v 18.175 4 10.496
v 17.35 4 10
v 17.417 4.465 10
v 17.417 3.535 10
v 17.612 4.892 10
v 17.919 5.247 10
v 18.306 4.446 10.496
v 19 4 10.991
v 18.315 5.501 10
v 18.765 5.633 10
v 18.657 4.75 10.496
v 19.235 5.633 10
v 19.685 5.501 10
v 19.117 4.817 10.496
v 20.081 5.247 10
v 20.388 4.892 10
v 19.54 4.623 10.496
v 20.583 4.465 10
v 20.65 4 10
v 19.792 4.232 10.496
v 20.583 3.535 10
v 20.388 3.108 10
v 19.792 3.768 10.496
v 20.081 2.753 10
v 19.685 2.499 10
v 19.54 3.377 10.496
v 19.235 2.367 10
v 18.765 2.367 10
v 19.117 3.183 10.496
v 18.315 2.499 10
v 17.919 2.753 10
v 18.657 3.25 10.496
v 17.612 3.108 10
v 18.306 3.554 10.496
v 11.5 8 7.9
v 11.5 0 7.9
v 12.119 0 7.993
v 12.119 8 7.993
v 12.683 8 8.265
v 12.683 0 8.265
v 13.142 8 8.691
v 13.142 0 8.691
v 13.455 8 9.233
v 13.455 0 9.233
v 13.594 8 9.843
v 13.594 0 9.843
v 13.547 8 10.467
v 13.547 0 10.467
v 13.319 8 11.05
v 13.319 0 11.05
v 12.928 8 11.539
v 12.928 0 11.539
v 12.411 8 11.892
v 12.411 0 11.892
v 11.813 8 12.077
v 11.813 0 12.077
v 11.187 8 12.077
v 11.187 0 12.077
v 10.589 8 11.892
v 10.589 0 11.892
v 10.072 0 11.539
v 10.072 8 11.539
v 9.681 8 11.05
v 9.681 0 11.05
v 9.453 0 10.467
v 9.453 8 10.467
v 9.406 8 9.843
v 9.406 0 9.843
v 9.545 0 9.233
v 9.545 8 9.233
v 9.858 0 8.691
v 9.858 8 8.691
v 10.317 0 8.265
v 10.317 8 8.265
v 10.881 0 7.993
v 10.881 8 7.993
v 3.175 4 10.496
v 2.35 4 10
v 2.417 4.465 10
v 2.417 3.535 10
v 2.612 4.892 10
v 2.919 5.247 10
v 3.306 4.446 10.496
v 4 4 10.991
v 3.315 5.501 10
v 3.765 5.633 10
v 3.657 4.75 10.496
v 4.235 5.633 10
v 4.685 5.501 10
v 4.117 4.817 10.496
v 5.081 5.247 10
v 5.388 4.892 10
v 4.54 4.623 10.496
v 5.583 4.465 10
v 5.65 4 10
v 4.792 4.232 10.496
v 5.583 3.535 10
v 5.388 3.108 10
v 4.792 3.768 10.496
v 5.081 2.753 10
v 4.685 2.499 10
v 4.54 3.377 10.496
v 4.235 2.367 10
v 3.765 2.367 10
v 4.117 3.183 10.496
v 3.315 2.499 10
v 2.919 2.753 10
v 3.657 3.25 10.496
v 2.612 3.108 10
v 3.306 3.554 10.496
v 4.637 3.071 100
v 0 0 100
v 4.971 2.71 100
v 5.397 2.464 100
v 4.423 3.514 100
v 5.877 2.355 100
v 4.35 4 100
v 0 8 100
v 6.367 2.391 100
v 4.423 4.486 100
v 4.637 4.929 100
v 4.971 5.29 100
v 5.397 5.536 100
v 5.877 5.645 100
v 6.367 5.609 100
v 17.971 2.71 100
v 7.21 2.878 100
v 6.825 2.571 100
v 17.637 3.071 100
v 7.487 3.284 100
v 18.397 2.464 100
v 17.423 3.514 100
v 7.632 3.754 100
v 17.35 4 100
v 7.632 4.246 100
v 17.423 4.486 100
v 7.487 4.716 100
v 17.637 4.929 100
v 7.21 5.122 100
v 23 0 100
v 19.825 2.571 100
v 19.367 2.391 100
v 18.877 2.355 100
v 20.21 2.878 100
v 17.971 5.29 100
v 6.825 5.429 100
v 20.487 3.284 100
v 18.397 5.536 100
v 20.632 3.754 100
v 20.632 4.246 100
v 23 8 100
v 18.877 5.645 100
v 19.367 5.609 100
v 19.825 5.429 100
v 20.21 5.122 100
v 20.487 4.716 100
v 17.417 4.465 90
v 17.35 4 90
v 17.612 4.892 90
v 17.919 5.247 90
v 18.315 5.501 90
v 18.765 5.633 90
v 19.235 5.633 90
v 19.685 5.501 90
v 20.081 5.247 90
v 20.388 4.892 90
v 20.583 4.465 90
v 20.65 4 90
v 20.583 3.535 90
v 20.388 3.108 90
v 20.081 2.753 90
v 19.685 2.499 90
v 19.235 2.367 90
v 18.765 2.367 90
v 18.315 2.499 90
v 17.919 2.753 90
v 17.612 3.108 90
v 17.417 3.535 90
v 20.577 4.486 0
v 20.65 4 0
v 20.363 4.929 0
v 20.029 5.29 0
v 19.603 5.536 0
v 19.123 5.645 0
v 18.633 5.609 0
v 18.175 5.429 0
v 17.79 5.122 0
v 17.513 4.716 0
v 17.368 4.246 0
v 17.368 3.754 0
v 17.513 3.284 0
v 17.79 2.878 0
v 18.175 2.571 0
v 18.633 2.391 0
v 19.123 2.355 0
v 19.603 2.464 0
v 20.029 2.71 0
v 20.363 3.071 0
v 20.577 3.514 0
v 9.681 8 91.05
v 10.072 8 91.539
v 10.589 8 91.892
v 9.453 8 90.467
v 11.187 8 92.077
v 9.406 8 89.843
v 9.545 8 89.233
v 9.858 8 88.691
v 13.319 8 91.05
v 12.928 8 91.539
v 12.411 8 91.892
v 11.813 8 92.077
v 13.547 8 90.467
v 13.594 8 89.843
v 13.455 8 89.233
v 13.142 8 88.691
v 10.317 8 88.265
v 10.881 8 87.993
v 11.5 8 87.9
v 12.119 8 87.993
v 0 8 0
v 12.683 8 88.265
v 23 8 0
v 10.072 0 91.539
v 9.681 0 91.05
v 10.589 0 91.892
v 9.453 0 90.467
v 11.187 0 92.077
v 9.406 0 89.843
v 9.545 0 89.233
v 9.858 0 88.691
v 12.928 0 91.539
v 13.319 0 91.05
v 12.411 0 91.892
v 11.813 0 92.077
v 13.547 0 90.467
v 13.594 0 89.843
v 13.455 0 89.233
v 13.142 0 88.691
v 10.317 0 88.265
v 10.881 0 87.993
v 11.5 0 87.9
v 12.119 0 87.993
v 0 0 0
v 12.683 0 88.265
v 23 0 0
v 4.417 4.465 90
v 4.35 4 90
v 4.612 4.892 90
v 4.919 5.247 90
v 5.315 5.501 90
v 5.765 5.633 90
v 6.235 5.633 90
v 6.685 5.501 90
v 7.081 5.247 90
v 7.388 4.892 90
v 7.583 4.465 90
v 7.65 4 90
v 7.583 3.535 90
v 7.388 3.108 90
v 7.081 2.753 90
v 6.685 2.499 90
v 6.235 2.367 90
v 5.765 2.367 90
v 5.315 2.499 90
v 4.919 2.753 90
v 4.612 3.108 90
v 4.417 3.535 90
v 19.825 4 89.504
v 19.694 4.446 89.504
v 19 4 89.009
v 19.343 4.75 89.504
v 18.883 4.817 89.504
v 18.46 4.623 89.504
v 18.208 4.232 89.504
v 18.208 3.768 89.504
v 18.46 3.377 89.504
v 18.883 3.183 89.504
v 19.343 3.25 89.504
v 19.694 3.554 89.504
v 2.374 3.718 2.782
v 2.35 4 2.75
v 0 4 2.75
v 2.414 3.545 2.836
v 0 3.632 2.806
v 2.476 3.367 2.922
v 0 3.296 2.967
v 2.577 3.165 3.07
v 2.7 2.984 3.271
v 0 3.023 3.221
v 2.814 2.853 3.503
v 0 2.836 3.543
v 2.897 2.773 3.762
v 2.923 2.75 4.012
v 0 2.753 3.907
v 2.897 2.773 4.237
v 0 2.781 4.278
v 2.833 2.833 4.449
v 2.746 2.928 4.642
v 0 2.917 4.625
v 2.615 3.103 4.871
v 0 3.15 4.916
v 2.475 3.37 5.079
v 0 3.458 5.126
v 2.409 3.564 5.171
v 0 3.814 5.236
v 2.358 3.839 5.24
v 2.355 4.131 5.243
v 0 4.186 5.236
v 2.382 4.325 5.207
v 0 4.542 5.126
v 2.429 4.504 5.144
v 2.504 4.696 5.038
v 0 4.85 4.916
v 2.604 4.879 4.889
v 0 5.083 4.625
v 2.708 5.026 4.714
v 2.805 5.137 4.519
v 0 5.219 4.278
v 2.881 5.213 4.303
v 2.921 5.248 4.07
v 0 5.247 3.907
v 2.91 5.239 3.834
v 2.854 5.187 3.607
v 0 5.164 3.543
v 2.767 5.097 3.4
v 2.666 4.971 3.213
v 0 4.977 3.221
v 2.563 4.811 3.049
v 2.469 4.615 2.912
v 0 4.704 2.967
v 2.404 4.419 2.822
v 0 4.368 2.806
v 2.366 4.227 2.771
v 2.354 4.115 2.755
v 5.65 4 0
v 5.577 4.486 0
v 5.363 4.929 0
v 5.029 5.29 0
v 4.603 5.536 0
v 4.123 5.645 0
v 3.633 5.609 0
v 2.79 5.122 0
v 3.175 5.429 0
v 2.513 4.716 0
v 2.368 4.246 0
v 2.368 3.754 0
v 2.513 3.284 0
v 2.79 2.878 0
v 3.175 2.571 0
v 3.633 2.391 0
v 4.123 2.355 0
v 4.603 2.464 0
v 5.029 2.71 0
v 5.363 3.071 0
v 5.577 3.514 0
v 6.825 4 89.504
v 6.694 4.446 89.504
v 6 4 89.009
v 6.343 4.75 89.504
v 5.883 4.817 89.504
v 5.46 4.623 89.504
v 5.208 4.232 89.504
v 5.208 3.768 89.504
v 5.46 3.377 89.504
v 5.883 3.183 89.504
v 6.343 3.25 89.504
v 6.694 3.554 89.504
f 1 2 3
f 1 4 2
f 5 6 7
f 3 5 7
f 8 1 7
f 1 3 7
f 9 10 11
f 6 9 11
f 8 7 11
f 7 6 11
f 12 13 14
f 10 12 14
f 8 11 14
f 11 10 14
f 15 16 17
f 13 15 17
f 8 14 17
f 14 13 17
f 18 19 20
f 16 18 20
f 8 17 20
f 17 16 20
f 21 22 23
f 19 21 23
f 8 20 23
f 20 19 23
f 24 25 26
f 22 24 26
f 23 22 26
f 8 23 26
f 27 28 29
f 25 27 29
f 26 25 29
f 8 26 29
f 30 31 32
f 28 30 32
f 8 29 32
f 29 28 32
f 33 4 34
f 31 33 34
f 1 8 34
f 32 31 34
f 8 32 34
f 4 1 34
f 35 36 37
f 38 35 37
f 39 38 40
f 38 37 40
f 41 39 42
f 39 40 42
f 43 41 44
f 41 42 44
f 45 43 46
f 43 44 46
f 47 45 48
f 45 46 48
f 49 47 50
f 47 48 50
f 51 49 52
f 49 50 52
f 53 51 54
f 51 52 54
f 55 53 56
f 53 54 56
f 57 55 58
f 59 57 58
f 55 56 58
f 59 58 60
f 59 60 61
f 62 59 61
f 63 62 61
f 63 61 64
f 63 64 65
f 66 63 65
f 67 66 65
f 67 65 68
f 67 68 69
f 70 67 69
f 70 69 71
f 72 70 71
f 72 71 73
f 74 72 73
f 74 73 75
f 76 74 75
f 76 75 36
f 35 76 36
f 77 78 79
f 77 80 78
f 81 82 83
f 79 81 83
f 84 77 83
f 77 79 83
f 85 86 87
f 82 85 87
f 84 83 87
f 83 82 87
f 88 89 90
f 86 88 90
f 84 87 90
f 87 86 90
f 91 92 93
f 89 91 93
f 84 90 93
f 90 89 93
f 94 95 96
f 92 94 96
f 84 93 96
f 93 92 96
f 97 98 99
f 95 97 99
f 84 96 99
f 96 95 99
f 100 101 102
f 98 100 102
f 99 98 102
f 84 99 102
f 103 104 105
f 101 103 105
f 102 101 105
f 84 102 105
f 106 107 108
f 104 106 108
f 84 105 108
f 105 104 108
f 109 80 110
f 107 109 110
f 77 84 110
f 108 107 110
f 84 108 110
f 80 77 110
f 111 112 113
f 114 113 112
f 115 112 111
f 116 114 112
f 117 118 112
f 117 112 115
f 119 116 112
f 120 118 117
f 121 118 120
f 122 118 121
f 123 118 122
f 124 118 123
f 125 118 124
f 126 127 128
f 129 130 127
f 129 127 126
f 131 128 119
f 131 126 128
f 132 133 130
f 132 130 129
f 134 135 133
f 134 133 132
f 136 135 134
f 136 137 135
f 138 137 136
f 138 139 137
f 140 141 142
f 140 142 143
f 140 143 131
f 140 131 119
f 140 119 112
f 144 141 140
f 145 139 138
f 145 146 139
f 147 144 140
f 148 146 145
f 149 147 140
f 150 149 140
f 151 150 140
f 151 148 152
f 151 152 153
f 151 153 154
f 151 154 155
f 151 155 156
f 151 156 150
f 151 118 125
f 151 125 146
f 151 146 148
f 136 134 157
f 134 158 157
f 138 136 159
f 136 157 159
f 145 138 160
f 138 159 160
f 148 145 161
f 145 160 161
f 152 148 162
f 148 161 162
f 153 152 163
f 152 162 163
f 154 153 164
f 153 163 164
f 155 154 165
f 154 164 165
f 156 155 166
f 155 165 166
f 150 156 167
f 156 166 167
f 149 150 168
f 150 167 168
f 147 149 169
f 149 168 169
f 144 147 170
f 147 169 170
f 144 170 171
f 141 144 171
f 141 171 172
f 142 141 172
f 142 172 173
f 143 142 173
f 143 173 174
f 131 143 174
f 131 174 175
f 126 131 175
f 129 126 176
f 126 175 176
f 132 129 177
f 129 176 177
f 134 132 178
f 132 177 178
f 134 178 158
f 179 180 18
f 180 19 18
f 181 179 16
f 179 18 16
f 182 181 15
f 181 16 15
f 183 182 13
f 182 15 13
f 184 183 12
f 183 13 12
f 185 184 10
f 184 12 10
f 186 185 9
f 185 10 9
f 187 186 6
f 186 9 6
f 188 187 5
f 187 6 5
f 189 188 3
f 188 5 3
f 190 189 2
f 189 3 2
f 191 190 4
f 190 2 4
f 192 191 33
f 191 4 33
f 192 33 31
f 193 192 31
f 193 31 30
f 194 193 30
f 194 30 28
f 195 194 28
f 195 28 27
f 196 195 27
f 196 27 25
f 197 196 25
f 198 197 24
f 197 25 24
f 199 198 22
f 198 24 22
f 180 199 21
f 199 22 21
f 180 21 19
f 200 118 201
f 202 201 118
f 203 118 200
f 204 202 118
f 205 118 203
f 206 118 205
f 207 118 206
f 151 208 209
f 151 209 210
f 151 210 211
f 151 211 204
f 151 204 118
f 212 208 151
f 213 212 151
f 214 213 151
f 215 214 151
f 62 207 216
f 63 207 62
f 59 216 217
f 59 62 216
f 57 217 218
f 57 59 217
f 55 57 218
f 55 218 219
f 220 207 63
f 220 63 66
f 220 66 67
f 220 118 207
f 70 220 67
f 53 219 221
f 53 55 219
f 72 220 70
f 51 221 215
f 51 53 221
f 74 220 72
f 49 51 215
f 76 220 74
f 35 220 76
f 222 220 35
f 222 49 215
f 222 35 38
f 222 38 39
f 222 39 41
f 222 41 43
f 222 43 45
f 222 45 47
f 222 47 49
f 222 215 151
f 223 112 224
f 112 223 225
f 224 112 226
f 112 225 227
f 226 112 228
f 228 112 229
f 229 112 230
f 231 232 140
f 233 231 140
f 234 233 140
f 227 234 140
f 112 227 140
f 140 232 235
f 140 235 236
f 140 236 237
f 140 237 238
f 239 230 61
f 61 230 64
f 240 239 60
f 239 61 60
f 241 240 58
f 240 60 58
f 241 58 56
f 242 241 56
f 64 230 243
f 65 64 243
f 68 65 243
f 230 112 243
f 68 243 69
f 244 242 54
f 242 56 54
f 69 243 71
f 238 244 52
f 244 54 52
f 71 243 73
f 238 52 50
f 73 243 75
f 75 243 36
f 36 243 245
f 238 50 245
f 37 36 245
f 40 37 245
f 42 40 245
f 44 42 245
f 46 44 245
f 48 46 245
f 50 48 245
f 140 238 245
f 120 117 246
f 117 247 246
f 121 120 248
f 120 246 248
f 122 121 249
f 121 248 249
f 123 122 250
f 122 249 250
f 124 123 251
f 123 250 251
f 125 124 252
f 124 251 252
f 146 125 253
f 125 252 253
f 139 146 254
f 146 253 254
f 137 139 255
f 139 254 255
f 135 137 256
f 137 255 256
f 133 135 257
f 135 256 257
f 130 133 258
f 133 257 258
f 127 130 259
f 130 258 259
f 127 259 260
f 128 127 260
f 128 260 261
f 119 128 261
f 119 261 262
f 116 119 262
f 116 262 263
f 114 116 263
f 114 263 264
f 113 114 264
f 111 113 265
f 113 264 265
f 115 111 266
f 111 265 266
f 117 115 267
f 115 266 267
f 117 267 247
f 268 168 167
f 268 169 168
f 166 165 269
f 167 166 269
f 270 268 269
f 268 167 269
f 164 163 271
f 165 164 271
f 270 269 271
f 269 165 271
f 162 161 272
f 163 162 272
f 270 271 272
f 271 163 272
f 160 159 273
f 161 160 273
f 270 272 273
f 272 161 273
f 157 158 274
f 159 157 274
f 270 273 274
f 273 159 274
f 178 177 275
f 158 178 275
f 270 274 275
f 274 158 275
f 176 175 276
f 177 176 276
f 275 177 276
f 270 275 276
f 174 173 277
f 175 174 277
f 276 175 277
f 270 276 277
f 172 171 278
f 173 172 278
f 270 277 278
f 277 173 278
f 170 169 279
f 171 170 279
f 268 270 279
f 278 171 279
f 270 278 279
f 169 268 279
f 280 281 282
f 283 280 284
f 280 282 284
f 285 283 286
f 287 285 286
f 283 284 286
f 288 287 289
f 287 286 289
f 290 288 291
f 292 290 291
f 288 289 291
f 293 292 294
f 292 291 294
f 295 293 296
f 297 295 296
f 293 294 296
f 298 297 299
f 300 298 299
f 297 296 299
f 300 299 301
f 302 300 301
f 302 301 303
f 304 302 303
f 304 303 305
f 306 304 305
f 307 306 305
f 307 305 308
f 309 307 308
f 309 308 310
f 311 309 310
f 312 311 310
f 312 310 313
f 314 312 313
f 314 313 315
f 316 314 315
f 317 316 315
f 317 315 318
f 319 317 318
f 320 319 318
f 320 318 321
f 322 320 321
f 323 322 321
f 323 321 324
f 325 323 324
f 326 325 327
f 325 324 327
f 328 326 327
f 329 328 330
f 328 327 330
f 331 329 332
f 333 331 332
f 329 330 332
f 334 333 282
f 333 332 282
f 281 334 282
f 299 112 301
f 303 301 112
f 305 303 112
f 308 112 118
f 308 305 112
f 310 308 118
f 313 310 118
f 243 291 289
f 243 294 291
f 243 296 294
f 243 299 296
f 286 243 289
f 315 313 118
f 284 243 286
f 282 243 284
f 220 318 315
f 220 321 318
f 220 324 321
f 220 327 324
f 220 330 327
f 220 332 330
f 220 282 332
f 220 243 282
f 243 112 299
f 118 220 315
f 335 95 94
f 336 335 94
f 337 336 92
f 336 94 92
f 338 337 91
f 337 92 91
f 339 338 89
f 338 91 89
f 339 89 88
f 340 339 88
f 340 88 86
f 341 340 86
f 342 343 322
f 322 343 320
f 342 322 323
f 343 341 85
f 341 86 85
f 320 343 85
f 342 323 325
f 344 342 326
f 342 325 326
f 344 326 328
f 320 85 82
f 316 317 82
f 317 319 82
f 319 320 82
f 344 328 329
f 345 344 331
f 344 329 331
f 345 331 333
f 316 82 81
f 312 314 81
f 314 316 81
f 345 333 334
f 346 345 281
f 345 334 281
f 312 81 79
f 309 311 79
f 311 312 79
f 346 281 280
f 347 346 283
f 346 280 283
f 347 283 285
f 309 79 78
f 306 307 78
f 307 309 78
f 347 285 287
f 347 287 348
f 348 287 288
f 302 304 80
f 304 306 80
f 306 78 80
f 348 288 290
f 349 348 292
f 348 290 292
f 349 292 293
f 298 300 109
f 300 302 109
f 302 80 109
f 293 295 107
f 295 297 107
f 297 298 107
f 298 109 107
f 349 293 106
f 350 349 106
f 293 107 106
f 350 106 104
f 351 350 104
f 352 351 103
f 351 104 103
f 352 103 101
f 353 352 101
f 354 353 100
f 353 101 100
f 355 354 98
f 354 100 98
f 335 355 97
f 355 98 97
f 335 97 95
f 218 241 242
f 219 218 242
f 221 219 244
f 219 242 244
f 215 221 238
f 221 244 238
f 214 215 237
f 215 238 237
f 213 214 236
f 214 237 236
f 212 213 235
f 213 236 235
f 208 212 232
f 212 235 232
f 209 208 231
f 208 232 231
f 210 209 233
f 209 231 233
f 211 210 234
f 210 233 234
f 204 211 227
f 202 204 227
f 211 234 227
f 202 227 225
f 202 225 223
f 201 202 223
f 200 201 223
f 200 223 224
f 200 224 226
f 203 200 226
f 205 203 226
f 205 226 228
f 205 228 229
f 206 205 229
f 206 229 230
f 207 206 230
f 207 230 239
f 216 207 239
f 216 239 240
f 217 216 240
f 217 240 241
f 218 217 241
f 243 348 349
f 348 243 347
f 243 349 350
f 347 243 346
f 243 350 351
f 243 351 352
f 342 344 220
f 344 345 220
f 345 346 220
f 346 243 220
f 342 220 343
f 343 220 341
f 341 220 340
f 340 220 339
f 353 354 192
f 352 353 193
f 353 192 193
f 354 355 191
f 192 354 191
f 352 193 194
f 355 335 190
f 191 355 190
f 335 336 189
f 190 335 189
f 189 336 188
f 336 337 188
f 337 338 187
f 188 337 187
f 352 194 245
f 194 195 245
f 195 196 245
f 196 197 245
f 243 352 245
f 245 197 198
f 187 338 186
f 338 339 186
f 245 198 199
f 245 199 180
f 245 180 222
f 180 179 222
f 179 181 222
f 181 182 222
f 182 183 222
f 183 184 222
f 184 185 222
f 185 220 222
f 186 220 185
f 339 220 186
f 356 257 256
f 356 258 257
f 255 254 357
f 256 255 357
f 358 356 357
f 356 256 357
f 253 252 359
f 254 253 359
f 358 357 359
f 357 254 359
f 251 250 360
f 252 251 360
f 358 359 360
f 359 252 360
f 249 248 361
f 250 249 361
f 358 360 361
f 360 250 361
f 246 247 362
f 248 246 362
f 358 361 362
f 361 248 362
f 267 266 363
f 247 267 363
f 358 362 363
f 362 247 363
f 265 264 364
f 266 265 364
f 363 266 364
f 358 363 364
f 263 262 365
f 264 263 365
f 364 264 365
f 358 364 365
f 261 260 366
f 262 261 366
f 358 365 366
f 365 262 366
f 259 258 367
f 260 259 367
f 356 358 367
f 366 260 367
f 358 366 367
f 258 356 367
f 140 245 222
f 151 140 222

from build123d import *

# Parameters (mm, degrees)
SKETCH3_W                       = 23
SKETCH3_H                       = 8
EXTRUDE1_DEPTH                  = 100
M5_TAPPED_HOLE1_D               = 4.2
M4_TAPPED_HOLE1_D               = 3.3
M4_TAPPED_HOLE1_DEPTH           = 10
M4_TAPPED_HOLE1_TIP             = 0.991420021
M4_TAPPED_HOLE1_ON_FACE_2_D     = 3.3
M4_TAPPED_HOLE1_ON_FACE_2_DEPTH = 10
M4_TAPPED_HOLE1_ON_FACE_2_TIP   = 0.991420021
M3_TAPPED_HOLE1_REACH           = 25
M3_TAPPED_HOLE1_BORE_R          = 1.25


with BuildPart() as part:
    # Sketch3 → Extrude1 (new body)
    with BuildSketch(Plane.XY):
        with Locations((11.5, 4)):
            Rectangle(SKETCH3_W, SKETCH3_H)
    extrude(amount=EXTRUDE1_DEPTH)

    # M5 Tapped Hole1 (through all)
    with Locations(Plane(origin=(11.5, 8, 90), x_dir=(0, 0, 1), z_dir=(0, 1, 0))):
        with Locations((0, 0), (-80, 0)):
            Hole(M5_TAPPED_HOLE1_D / 2)

    # M4 Tapped Hole1
    with Locations(Plane(origin=(6, 4, 100), x_dir=(1, 0, 0), z_dir=(0, 0, 1))):
        with Locations((0, 0), (13, 0)):
            Hole(M4_TAPPED_HOLE1_D / 2, depth=M4_TAPPED_HOLE1_DEPTH)
            with Locations((0, 0, -(M4_TAPPED_HOLE1_DEPTH + M4_TAPPED_HOLE1_TIP / 2))):  # 118° drill point
                Cone(0, M4_TAPPED_HOLE1_D / 2, M4_TAPPED_HOLE1_TIP, mode=Mode.SUBTRACT)

    # M4 Tapped Hole1 on face 2
    with Locations(Plane(origin=(19, 4, 0), x_dir=(-1, 0, 0), z_dir=(0, 0, -1))):
        with Locations((0, 0), (15, 0)):
            Hole(M4_TAPPED_HOLE1_ON_FACE_2_D / 2, depth=M4_TAPPED_HOLE1_ON_FACE_2_DEPTH)
            with Locations((0, 0, -(M4_TAPPED_HOLE1_ON_FACE_2_DEPTH + M4_TAPPED_HOLE1_ON_FACE_2_TIP / 2))):  # 118° drill point
                Cone(0, M4_TAPPED_HOLE1_ON_FACE_2_D / 2, M4_TAPPED_HOLE1_ON_FACE_2_TIP, mode=Mode.SUBTRACT)

    # M3 Tapped Hole1 bore (on position points) → M3 Tapped Hole1 (cut, up to next)
    with BuildSketch(Plane(origin=(0, 4, 4), x_dir=(0, 0, -1), z_dir=(-1, 0, 0)), mode=Mode.PRIVATE) as m3_tapped_hole1_sk1:
        Circle(M3_TAPPED_HOLE1_BORE_R)
    m3_tapped_hole1_tool1 = extrude(m3_tapped_hole1_sk1.sketch, amount=-M3_TAPPED_HOLE1_REACH, mode=Mode.PRIVATE) & part.part
    add(m3_tapped_hole1_tool1.solids().sort_by_distance((0, 4, 4))[0], mode=Mode.SUBTRACT)


solid = part.part
